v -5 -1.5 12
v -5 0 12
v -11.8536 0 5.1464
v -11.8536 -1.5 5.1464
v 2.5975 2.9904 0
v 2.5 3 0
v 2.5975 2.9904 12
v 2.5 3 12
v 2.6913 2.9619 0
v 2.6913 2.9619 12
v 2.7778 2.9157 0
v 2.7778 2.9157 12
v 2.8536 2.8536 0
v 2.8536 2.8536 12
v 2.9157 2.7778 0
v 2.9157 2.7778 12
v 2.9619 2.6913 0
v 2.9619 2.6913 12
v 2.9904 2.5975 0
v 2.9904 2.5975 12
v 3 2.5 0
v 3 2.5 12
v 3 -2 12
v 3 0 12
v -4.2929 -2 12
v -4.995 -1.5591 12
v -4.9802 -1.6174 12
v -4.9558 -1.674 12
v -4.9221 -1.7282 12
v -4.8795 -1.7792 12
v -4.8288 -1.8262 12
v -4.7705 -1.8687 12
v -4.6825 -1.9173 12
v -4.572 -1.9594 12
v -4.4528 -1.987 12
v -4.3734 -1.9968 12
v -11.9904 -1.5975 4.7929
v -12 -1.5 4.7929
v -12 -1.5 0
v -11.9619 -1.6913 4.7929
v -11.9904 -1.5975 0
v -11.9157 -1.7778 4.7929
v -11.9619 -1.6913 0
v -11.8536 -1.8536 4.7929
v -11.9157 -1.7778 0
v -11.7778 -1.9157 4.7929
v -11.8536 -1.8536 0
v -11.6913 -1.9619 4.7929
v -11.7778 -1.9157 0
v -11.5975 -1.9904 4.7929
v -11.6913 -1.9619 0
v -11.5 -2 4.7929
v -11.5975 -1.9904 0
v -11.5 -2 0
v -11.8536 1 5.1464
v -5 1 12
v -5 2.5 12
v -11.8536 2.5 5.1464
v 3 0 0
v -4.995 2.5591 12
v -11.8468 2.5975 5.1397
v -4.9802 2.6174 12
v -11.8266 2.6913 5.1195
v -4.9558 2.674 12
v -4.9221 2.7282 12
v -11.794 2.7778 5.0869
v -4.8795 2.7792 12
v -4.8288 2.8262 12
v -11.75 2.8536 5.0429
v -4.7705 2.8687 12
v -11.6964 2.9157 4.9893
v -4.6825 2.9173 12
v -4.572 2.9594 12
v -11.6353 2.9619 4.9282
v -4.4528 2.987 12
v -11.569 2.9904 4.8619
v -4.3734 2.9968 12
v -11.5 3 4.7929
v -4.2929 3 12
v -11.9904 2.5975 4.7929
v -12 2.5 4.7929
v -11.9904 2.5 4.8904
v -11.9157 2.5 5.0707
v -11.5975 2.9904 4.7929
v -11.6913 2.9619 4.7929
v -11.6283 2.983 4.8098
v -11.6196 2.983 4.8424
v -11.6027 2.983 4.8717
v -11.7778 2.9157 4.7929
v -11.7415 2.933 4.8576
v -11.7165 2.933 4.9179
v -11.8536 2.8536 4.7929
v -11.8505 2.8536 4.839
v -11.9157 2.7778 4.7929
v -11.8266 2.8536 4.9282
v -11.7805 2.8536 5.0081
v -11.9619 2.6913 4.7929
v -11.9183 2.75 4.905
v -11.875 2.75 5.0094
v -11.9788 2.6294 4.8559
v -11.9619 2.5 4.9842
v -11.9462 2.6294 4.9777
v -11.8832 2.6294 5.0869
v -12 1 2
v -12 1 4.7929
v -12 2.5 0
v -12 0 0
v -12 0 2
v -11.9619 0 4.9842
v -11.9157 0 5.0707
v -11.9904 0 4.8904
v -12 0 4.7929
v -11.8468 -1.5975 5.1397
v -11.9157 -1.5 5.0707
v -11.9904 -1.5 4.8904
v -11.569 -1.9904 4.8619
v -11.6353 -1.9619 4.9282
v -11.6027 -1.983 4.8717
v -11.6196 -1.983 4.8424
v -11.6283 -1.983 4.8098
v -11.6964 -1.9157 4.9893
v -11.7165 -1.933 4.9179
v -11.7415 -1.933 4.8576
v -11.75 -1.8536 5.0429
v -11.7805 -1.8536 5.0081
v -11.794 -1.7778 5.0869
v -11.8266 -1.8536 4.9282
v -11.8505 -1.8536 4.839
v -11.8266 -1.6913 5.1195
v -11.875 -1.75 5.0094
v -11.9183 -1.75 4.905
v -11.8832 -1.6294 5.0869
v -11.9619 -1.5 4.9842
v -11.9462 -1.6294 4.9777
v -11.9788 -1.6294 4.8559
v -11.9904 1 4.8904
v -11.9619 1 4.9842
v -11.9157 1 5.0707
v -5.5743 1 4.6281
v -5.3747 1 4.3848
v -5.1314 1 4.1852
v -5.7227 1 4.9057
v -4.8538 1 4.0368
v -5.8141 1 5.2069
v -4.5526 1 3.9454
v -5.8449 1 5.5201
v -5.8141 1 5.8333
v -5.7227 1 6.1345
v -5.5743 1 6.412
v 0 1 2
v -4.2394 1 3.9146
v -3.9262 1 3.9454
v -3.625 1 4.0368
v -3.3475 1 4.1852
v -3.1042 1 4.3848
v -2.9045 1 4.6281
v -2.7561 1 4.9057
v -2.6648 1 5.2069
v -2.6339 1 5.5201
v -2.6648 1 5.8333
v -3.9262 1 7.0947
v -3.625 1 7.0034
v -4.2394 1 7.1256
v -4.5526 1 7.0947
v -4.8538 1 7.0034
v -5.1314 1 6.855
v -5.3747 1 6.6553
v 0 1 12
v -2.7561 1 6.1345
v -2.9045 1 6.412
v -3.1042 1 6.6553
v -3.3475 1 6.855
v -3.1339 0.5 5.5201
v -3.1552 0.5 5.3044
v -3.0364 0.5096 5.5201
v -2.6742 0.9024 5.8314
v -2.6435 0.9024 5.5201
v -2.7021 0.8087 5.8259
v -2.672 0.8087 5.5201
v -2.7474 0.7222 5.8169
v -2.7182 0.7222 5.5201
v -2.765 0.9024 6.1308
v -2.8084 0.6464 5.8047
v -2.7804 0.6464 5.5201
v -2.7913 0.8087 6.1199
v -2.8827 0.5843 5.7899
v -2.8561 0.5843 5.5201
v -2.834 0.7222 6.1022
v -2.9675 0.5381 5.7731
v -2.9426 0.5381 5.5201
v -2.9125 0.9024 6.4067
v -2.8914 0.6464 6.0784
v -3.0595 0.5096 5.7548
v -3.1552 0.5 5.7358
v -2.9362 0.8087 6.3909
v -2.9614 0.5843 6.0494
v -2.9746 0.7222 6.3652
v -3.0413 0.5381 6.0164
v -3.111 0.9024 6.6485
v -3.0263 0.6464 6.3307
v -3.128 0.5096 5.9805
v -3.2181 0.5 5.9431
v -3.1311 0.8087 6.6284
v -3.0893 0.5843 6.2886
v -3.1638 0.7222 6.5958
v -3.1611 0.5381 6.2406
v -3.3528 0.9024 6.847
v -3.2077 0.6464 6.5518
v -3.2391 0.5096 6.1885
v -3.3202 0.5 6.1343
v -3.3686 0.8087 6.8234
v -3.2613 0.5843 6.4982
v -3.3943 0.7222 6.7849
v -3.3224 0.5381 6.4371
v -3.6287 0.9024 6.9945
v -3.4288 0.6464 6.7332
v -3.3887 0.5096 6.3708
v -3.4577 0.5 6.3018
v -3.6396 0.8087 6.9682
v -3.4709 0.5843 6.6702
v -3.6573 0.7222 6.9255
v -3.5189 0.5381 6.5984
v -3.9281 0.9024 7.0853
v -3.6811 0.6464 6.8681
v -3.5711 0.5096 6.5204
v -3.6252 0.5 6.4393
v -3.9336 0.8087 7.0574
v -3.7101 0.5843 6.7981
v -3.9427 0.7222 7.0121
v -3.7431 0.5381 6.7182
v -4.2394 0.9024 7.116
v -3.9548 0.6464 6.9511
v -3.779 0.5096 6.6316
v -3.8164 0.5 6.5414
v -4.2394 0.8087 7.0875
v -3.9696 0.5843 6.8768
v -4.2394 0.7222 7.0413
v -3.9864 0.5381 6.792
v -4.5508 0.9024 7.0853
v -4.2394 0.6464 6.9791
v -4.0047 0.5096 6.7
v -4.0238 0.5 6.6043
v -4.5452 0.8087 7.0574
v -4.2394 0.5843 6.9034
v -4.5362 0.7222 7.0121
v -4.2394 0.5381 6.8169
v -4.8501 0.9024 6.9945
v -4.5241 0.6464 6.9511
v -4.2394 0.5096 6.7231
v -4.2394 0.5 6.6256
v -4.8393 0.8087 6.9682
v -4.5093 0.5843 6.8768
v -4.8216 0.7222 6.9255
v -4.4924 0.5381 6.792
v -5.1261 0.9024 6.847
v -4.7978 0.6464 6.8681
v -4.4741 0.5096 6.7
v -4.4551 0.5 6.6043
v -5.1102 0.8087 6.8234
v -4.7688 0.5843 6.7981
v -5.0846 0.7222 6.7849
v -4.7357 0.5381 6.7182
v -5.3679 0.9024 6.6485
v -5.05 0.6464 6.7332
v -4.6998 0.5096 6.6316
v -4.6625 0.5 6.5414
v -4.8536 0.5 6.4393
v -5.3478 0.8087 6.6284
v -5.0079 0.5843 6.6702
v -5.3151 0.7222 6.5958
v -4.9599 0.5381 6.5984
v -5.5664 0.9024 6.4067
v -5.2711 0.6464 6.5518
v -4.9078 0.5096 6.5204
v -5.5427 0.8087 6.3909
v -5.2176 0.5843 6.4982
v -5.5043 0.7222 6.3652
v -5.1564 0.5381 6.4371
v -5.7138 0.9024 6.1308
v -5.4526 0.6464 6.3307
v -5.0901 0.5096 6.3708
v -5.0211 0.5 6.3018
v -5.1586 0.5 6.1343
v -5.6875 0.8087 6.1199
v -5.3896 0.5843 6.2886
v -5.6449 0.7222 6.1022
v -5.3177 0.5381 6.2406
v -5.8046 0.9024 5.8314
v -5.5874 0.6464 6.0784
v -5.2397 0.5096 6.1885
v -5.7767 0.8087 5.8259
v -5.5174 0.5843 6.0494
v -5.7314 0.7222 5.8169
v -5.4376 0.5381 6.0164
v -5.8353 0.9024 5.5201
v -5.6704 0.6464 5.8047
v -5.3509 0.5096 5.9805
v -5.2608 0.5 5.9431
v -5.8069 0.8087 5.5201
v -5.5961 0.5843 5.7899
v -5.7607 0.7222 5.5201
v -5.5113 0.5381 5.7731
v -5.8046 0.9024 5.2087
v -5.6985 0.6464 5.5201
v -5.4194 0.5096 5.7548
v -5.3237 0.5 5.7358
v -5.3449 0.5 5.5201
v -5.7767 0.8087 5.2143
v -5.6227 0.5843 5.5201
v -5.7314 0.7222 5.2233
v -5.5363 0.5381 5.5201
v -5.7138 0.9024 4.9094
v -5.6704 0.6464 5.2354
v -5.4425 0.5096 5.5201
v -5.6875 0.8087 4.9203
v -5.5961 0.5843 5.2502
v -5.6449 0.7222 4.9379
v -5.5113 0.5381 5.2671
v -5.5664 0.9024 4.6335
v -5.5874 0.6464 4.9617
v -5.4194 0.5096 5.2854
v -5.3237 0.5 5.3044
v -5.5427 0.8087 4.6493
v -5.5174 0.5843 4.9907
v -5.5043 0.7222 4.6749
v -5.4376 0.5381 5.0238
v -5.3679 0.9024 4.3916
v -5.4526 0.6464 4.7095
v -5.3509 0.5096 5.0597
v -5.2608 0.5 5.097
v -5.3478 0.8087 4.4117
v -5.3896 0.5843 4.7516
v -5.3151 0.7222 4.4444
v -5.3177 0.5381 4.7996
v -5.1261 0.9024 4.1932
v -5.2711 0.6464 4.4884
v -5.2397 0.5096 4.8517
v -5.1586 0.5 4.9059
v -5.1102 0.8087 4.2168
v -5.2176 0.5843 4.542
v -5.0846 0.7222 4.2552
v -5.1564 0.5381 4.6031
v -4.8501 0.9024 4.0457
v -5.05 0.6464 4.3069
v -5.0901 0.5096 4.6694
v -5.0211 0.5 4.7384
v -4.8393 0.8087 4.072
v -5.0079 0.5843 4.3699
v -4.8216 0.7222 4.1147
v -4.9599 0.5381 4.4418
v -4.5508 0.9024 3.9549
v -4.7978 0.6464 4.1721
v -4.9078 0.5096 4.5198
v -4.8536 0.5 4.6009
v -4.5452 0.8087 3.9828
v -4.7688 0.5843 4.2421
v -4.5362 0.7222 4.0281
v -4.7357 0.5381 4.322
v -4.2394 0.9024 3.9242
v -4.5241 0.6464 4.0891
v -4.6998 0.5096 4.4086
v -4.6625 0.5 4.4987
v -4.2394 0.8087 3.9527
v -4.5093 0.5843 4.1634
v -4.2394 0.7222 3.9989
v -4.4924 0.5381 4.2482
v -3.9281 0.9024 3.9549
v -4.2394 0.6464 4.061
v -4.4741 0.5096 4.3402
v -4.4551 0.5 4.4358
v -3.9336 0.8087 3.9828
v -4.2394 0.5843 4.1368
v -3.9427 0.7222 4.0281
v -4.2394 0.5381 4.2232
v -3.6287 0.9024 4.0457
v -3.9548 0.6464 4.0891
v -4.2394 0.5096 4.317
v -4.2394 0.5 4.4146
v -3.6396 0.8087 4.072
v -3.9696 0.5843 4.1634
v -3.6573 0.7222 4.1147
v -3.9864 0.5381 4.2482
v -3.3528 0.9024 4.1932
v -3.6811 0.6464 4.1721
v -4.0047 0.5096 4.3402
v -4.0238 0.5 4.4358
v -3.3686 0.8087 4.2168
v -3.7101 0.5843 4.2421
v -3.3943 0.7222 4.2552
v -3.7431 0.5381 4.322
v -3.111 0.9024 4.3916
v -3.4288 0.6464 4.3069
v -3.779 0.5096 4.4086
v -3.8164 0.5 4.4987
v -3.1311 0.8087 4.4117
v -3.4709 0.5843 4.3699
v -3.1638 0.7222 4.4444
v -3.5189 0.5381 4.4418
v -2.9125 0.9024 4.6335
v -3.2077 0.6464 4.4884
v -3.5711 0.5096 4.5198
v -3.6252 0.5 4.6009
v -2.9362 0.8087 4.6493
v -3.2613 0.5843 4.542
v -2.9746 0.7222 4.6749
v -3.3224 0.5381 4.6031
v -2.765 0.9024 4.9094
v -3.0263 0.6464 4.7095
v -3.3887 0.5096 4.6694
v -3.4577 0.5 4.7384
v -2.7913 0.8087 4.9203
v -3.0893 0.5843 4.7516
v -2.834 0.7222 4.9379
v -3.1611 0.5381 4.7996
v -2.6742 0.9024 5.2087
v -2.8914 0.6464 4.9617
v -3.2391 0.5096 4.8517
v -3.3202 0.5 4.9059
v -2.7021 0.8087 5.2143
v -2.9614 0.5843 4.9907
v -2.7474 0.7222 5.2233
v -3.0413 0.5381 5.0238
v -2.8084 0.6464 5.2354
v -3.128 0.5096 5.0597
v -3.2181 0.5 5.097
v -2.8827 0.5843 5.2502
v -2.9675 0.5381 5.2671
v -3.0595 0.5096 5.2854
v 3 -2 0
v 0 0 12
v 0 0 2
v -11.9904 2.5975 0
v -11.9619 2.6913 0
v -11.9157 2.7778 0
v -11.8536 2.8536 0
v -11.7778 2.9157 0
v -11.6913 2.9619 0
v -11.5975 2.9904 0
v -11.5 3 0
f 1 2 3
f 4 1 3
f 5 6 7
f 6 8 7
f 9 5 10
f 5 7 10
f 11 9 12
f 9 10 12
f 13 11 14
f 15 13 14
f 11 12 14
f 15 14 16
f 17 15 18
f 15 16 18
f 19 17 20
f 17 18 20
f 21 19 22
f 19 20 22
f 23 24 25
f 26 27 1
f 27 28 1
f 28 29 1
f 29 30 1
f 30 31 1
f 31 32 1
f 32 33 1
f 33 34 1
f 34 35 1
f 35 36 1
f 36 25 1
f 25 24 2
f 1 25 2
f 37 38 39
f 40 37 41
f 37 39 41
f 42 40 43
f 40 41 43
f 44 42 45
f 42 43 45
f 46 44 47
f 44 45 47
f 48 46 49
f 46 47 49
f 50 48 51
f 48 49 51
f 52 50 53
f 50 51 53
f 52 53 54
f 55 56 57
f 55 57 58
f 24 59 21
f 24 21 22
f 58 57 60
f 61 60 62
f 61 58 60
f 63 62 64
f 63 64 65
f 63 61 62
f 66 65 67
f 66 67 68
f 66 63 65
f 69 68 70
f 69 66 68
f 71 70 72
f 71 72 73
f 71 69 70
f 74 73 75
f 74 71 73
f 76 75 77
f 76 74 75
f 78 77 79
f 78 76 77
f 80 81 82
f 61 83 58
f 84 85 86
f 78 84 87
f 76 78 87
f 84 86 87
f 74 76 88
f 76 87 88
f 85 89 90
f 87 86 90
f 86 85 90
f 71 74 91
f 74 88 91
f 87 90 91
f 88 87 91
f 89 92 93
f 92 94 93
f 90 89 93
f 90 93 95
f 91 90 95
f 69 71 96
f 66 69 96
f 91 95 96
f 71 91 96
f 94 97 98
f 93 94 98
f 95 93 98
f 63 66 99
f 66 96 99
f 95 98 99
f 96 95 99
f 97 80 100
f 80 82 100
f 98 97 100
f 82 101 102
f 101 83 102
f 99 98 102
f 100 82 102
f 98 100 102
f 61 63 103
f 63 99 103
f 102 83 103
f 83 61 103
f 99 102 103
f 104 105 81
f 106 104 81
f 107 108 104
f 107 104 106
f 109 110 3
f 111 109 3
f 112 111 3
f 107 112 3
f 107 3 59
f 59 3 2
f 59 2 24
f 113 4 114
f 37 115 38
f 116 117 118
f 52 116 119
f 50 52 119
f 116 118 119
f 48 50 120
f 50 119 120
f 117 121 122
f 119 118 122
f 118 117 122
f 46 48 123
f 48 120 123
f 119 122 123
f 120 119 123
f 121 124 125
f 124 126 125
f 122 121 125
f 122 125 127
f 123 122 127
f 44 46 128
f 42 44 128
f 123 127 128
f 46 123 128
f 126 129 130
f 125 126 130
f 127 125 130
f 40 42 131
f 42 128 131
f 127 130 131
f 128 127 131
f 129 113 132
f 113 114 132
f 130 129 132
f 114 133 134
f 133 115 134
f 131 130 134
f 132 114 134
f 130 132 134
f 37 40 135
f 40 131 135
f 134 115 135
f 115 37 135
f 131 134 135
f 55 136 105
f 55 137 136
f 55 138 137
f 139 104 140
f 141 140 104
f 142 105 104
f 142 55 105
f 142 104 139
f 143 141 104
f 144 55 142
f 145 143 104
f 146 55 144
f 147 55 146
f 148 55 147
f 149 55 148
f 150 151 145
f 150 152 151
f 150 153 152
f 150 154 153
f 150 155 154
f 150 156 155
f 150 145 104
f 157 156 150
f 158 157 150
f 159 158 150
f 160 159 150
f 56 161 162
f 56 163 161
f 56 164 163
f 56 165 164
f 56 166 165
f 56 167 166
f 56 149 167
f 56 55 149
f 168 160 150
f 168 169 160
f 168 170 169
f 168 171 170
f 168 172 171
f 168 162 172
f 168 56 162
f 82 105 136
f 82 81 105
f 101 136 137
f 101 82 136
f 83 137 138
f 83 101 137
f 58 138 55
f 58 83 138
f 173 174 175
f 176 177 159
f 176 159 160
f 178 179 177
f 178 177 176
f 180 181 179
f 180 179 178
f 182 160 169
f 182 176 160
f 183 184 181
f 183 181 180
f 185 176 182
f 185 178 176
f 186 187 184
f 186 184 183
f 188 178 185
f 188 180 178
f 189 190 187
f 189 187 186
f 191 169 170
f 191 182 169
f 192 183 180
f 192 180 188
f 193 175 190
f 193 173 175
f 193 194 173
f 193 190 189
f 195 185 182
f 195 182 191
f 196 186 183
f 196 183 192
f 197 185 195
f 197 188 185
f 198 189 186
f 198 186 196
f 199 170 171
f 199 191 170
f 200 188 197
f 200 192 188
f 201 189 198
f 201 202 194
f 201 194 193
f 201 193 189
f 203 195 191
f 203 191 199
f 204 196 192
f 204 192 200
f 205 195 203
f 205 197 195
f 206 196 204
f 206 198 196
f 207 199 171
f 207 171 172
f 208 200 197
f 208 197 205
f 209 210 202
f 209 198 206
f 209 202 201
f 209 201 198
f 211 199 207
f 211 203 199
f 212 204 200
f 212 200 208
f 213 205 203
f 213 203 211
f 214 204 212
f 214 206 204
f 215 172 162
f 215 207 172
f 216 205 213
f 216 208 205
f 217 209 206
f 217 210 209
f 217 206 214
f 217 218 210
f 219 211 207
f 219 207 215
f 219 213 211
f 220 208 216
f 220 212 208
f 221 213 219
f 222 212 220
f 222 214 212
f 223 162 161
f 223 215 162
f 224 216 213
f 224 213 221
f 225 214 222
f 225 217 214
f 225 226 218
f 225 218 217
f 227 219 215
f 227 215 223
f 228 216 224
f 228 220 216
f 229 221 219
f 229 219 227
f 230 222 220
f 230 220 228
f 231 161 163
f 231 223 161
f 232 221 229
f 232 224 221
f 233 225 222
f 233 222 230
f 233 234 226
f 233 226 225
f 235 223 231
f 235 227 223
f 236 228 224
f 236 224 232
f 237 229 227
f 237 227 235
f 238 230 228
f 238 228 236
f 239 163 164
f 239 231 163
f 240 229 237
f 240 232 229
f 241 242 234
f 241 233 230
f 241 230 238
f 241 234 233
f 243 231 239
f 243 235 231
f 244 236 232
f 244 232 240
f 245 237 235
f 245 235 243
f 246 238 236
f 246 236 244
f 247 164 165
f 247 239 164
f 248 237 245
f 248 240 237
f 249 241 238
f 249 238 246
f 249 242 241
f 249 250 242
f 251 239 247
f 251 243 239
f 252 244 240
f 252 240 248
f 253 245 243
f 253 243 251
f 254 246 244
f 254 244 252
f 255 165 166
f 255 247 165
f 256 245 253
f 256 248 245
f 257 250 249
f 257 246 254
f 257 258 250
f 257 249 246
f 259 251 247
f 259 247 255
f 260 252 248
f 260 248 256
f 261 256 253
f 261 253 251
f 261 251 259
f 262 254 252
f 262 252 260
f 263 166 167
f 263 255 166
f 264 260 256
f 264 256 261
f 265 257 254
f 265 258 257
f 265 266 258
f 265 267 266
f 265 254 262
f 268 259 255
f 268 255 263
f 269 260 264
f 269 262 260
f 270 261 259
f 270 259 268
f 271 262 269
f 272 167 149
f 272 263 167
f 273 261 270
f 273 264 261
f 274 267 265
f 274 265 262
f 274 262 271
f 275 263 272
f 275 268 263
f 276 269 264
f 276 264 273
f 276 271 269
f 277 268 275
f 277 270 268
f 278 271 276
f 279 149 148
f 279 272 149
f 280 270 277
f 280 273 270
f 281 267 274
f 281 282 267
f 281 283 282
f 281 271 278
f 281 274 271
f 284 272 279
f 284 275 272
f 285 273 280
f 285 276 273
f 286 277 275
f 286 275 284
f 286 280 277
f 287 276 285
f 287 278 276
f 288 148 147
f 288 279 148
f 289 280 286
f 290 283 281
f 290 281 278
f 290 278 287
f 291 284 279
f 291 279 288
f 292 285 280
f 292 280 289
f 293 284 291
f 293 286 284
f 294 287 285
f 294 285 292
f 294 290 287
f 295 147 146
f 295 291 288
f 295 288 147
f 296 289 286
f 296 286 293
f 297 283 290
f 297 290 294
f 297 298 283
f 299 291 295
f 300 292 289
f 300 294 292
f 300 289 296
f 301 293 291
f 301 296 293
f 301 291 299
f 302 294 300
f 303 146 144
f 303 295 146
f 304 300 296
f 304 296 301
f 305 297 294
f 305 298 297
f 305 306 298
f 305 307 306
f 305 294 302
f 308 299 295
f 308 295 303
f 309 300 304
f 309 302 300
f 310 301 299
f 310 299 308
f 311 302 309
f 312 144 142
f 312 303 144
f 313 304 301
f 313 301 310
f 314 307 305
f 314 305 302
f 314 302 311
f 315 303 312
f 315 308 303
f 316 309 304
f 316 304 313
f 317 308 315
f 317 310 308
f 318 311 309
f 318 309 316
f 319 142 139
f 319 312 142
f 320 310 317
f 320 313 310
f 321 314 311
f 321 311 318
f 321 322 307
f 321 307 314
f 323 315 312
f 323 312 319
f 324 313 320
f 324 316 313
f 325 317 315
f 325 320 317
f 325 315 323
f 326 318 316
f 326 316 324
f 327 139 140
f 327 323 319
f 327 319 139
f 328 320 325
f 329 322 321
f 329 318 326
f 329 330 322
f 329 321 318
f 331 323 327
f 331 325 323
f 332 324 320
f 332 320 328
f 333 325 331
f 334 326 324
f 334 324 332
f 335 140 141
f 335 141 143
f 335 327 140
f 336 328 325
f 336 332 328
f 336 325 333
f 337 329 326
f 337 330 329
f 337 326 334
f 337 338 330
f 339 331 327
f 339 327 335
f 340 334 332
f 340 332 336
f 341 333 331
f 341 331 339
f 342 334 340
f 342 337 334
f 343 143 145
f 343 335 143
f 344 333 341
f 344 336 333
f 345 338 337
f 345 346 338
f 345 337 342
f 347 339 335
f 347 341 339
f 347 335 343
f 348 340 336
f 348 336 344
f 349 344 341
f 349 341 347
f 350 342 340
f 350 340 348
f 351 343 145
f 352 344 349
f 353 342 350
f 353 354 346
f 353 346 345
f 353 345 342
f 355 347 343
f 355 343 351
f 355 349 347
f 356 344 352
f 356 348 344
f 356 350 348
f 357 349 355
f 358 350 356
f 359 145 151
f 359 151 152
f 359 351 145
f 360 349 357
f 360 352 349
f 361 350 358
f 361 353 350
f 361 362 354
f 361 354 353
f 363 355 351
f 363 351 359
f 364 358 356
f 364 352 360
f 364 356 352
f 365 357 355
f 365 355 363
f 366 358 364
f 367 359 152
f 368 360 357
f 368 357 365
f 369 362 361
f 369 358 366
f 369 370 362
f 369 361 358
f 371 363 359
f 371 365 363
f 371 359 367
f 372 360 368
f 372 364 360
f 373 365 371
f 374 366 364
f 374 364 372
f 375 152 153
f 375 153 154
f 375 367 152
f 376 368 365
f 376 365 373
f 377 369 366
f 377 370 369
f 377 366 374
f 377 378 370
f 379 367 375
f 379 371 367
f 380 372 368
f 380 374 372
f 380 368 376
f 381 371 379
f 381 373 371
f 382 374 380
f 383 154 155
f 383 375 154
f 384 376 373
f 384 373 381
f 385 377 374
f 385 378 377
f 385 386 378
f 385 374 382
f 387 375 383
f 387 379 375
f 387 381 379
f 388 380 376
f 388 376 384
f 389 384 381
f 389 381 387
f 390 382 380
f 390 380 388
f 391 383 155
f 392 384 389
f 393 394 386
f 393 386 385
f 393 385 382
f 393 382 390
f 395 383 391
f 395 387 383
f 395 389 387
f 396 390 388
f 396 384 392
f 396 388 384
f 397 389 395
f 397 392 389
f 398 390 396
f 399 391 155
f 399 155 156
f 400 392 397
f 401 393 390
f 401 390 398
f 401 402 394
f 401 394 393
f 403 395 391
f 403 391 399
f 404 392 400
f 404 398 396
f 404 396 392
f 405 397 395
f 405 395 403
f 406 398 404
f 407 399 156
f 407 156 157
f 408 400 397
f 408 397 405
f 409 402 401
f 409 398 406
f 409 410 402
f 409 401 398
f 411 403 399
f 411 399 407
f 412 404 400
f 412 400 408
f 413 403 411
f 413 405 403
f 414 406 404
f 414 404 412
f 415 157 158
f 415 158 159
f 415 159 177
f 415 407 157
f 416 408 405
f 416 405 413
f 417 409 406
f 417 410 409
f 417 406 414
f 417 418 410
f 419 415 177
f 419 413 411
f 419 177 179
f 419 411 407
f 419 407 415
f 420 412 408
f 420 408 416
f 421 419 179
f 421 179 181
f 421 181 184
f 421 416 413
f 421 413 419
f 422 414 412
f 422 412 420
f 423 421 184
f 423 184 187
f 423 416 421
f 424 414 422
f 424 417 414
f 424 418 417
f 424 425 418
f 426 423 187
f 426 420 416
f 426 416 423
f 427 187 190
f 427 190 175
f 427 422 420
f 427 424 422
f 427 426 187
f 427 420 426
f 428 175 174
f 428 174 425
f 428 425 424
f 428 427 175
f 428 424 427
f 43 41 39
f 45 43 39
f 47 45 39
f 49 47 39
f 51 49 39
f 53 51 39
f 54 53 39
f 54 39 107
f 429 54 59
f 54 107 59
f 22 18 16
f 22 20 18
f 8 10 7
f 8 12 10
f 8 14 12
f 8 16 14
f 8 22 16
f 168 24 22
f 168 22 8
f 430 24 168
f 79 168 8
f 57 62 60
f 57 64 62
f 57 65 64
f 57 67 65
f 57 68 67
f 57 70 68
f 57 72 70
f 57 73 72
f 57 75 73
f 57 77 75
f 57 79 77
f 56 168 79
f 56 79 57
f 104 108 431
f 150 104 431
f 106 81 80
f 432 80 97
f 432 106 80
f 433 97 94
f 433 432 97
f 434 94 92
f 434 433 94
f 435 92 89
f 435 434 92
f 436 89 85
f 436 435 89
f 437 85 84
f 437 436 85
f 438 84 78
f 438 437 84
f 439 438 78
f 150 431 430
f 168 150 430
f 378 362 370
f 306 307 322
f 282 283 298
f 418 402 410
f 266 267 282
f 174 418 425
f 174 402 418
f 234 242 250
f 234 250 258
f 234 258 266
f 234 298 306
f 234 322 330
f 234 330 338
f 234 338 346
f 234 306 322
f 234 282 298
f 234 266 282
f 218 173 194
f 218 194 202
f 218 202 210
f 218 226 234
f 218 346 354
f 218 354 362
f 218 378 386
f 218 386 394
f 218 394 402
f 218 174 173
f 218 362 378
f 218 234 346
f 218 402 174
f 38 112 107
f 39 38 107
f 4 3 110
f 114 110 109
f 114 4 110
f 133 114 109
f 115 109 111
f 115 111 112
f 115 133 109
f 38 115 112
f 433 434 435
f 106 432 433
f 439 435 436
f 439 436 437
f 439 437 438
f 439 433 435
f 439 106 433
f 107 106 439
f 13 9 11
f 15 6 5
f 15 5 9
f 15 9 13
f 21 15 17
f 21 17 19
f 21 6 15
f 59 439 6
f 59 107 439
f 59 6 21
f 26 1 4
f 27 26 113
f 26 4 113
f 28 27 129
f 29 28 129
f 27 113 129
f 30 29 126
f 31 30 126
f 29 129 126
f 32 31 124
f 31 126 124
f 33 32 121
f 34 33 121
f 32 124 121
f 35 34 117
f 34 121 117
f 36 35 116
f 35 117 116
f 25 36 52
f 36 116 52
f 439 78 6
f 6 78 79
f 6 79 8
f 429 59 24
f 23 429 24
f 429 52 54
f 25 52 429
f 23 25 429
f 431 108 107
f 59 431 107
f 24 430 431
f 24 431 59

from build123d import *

# Parameters (mm, degrees)
F0_R     = 1.6054916764
F1_DEPTH = 3
F2_DEPTH = 1
F3_DEPTH = 0.5
F4_R     = 0.49999
F5_DEPTH = 2
F6_R     = 0.5
F7_R     = 0.5


# Not quite as in the source:
# - a fillet or chamfer is up to 0.001 mm smaller than in the source, because OpenCascade refuses the exact size


with BuildPart() as f1:
    # F0 (on Front) → F1 (new body)
    with BuildSketch(Plane.XZ):
        Polygon((0, 2), (0, 12), (-5, 12), (-12, 5), (-12, 2), align=None)
        with Locations((-4.2394283228, 5.5200844072)):
            Circle(F0_R, mode=Mode.SUBTRACT)
        with Locations((-4.2394283228, 5.5200844072)):
            Circle(F0_R)
        Polygon((3, 12), (0, 12), (0, 2), (-12, 2), (-12, 0), (0, 0), (3, 0), align=None)
    extrude(amount=-F1_DEPTH)

    # F0 (on Front) → F2 (cut)
    with BuildSketch(Plane.XZ):
        Polygon((0, 2), (0, 12), (-5, 12), (-12, 5), (-12, 2), align=None)
        with Locations((-4.2394283228, 5.5200844072)):
            Circle(F0_R, mode=Mode.SUBTRACT)
    extrude(amount=-F2_DEPTH, mode=Mode.SUBTRACT)

    # F0 (on Front) → F3 (cut)
    with BuildSketch(Plane.XZ):
        with Locations((-4.2394283228, 5.5200844072)):
            Circle(F0_R)
    extrude(amount=-F3_DEPTH, mode=Mode.SUBTRACT)

    # F4 (radius 0.5 in the source; OpenCascade refuses exactly that, so slightly less here)
    f4_edges = [f1.edges().sort_by_distance(p)[0] for p in [
        (-5.84492, 0.5, 5.520084),
    ]]
    fillet(f4_edges, radius=F4_R)

    # F7
    f7_edges = [f1.edges().sort_by_distance(p)[0] for p in [
        (-8.5, 3, 8.5),
        (-12, 2, 5),
        (-12, 3, 2.5),
        (3, 3, 6),
    ]]
    fillet(f7_edges, radius=F7_R)


with BuildPart() as f5:
    # F0 (on Front) → F5 (new body)
    with BuildSketch(Plane.XZ):
        Polygon((0, 2), (0, 12), (-5, 12), (-12, 5), (-12, 2), align=None)
        with Locations((-4.2394283228, 5.5200844072)):
            Circle(F0_R, mode=Mode.SUBTRACT)
        Polygon((3, 12), (0, 12), (0, 2), (-12, 2), (-12, 0), (0, 0), (3, 0), align=None)
        with Locations((-4.2394283228, 5.5200844072)):
            Circle(F0_R)
    extrude(amount=F5_DEPTH)

    # F6
    f6_edges = [f5.edges().sort_by_distance(p)[0] for p in [
        (-8.5, -2, 8.5),
        (-12, -2, 2.5),
        (-12, -1, 5),
    ]]
    fillet(f6_edges, radius=F6_R)


solid = Compound([f1.part, f5.part])
